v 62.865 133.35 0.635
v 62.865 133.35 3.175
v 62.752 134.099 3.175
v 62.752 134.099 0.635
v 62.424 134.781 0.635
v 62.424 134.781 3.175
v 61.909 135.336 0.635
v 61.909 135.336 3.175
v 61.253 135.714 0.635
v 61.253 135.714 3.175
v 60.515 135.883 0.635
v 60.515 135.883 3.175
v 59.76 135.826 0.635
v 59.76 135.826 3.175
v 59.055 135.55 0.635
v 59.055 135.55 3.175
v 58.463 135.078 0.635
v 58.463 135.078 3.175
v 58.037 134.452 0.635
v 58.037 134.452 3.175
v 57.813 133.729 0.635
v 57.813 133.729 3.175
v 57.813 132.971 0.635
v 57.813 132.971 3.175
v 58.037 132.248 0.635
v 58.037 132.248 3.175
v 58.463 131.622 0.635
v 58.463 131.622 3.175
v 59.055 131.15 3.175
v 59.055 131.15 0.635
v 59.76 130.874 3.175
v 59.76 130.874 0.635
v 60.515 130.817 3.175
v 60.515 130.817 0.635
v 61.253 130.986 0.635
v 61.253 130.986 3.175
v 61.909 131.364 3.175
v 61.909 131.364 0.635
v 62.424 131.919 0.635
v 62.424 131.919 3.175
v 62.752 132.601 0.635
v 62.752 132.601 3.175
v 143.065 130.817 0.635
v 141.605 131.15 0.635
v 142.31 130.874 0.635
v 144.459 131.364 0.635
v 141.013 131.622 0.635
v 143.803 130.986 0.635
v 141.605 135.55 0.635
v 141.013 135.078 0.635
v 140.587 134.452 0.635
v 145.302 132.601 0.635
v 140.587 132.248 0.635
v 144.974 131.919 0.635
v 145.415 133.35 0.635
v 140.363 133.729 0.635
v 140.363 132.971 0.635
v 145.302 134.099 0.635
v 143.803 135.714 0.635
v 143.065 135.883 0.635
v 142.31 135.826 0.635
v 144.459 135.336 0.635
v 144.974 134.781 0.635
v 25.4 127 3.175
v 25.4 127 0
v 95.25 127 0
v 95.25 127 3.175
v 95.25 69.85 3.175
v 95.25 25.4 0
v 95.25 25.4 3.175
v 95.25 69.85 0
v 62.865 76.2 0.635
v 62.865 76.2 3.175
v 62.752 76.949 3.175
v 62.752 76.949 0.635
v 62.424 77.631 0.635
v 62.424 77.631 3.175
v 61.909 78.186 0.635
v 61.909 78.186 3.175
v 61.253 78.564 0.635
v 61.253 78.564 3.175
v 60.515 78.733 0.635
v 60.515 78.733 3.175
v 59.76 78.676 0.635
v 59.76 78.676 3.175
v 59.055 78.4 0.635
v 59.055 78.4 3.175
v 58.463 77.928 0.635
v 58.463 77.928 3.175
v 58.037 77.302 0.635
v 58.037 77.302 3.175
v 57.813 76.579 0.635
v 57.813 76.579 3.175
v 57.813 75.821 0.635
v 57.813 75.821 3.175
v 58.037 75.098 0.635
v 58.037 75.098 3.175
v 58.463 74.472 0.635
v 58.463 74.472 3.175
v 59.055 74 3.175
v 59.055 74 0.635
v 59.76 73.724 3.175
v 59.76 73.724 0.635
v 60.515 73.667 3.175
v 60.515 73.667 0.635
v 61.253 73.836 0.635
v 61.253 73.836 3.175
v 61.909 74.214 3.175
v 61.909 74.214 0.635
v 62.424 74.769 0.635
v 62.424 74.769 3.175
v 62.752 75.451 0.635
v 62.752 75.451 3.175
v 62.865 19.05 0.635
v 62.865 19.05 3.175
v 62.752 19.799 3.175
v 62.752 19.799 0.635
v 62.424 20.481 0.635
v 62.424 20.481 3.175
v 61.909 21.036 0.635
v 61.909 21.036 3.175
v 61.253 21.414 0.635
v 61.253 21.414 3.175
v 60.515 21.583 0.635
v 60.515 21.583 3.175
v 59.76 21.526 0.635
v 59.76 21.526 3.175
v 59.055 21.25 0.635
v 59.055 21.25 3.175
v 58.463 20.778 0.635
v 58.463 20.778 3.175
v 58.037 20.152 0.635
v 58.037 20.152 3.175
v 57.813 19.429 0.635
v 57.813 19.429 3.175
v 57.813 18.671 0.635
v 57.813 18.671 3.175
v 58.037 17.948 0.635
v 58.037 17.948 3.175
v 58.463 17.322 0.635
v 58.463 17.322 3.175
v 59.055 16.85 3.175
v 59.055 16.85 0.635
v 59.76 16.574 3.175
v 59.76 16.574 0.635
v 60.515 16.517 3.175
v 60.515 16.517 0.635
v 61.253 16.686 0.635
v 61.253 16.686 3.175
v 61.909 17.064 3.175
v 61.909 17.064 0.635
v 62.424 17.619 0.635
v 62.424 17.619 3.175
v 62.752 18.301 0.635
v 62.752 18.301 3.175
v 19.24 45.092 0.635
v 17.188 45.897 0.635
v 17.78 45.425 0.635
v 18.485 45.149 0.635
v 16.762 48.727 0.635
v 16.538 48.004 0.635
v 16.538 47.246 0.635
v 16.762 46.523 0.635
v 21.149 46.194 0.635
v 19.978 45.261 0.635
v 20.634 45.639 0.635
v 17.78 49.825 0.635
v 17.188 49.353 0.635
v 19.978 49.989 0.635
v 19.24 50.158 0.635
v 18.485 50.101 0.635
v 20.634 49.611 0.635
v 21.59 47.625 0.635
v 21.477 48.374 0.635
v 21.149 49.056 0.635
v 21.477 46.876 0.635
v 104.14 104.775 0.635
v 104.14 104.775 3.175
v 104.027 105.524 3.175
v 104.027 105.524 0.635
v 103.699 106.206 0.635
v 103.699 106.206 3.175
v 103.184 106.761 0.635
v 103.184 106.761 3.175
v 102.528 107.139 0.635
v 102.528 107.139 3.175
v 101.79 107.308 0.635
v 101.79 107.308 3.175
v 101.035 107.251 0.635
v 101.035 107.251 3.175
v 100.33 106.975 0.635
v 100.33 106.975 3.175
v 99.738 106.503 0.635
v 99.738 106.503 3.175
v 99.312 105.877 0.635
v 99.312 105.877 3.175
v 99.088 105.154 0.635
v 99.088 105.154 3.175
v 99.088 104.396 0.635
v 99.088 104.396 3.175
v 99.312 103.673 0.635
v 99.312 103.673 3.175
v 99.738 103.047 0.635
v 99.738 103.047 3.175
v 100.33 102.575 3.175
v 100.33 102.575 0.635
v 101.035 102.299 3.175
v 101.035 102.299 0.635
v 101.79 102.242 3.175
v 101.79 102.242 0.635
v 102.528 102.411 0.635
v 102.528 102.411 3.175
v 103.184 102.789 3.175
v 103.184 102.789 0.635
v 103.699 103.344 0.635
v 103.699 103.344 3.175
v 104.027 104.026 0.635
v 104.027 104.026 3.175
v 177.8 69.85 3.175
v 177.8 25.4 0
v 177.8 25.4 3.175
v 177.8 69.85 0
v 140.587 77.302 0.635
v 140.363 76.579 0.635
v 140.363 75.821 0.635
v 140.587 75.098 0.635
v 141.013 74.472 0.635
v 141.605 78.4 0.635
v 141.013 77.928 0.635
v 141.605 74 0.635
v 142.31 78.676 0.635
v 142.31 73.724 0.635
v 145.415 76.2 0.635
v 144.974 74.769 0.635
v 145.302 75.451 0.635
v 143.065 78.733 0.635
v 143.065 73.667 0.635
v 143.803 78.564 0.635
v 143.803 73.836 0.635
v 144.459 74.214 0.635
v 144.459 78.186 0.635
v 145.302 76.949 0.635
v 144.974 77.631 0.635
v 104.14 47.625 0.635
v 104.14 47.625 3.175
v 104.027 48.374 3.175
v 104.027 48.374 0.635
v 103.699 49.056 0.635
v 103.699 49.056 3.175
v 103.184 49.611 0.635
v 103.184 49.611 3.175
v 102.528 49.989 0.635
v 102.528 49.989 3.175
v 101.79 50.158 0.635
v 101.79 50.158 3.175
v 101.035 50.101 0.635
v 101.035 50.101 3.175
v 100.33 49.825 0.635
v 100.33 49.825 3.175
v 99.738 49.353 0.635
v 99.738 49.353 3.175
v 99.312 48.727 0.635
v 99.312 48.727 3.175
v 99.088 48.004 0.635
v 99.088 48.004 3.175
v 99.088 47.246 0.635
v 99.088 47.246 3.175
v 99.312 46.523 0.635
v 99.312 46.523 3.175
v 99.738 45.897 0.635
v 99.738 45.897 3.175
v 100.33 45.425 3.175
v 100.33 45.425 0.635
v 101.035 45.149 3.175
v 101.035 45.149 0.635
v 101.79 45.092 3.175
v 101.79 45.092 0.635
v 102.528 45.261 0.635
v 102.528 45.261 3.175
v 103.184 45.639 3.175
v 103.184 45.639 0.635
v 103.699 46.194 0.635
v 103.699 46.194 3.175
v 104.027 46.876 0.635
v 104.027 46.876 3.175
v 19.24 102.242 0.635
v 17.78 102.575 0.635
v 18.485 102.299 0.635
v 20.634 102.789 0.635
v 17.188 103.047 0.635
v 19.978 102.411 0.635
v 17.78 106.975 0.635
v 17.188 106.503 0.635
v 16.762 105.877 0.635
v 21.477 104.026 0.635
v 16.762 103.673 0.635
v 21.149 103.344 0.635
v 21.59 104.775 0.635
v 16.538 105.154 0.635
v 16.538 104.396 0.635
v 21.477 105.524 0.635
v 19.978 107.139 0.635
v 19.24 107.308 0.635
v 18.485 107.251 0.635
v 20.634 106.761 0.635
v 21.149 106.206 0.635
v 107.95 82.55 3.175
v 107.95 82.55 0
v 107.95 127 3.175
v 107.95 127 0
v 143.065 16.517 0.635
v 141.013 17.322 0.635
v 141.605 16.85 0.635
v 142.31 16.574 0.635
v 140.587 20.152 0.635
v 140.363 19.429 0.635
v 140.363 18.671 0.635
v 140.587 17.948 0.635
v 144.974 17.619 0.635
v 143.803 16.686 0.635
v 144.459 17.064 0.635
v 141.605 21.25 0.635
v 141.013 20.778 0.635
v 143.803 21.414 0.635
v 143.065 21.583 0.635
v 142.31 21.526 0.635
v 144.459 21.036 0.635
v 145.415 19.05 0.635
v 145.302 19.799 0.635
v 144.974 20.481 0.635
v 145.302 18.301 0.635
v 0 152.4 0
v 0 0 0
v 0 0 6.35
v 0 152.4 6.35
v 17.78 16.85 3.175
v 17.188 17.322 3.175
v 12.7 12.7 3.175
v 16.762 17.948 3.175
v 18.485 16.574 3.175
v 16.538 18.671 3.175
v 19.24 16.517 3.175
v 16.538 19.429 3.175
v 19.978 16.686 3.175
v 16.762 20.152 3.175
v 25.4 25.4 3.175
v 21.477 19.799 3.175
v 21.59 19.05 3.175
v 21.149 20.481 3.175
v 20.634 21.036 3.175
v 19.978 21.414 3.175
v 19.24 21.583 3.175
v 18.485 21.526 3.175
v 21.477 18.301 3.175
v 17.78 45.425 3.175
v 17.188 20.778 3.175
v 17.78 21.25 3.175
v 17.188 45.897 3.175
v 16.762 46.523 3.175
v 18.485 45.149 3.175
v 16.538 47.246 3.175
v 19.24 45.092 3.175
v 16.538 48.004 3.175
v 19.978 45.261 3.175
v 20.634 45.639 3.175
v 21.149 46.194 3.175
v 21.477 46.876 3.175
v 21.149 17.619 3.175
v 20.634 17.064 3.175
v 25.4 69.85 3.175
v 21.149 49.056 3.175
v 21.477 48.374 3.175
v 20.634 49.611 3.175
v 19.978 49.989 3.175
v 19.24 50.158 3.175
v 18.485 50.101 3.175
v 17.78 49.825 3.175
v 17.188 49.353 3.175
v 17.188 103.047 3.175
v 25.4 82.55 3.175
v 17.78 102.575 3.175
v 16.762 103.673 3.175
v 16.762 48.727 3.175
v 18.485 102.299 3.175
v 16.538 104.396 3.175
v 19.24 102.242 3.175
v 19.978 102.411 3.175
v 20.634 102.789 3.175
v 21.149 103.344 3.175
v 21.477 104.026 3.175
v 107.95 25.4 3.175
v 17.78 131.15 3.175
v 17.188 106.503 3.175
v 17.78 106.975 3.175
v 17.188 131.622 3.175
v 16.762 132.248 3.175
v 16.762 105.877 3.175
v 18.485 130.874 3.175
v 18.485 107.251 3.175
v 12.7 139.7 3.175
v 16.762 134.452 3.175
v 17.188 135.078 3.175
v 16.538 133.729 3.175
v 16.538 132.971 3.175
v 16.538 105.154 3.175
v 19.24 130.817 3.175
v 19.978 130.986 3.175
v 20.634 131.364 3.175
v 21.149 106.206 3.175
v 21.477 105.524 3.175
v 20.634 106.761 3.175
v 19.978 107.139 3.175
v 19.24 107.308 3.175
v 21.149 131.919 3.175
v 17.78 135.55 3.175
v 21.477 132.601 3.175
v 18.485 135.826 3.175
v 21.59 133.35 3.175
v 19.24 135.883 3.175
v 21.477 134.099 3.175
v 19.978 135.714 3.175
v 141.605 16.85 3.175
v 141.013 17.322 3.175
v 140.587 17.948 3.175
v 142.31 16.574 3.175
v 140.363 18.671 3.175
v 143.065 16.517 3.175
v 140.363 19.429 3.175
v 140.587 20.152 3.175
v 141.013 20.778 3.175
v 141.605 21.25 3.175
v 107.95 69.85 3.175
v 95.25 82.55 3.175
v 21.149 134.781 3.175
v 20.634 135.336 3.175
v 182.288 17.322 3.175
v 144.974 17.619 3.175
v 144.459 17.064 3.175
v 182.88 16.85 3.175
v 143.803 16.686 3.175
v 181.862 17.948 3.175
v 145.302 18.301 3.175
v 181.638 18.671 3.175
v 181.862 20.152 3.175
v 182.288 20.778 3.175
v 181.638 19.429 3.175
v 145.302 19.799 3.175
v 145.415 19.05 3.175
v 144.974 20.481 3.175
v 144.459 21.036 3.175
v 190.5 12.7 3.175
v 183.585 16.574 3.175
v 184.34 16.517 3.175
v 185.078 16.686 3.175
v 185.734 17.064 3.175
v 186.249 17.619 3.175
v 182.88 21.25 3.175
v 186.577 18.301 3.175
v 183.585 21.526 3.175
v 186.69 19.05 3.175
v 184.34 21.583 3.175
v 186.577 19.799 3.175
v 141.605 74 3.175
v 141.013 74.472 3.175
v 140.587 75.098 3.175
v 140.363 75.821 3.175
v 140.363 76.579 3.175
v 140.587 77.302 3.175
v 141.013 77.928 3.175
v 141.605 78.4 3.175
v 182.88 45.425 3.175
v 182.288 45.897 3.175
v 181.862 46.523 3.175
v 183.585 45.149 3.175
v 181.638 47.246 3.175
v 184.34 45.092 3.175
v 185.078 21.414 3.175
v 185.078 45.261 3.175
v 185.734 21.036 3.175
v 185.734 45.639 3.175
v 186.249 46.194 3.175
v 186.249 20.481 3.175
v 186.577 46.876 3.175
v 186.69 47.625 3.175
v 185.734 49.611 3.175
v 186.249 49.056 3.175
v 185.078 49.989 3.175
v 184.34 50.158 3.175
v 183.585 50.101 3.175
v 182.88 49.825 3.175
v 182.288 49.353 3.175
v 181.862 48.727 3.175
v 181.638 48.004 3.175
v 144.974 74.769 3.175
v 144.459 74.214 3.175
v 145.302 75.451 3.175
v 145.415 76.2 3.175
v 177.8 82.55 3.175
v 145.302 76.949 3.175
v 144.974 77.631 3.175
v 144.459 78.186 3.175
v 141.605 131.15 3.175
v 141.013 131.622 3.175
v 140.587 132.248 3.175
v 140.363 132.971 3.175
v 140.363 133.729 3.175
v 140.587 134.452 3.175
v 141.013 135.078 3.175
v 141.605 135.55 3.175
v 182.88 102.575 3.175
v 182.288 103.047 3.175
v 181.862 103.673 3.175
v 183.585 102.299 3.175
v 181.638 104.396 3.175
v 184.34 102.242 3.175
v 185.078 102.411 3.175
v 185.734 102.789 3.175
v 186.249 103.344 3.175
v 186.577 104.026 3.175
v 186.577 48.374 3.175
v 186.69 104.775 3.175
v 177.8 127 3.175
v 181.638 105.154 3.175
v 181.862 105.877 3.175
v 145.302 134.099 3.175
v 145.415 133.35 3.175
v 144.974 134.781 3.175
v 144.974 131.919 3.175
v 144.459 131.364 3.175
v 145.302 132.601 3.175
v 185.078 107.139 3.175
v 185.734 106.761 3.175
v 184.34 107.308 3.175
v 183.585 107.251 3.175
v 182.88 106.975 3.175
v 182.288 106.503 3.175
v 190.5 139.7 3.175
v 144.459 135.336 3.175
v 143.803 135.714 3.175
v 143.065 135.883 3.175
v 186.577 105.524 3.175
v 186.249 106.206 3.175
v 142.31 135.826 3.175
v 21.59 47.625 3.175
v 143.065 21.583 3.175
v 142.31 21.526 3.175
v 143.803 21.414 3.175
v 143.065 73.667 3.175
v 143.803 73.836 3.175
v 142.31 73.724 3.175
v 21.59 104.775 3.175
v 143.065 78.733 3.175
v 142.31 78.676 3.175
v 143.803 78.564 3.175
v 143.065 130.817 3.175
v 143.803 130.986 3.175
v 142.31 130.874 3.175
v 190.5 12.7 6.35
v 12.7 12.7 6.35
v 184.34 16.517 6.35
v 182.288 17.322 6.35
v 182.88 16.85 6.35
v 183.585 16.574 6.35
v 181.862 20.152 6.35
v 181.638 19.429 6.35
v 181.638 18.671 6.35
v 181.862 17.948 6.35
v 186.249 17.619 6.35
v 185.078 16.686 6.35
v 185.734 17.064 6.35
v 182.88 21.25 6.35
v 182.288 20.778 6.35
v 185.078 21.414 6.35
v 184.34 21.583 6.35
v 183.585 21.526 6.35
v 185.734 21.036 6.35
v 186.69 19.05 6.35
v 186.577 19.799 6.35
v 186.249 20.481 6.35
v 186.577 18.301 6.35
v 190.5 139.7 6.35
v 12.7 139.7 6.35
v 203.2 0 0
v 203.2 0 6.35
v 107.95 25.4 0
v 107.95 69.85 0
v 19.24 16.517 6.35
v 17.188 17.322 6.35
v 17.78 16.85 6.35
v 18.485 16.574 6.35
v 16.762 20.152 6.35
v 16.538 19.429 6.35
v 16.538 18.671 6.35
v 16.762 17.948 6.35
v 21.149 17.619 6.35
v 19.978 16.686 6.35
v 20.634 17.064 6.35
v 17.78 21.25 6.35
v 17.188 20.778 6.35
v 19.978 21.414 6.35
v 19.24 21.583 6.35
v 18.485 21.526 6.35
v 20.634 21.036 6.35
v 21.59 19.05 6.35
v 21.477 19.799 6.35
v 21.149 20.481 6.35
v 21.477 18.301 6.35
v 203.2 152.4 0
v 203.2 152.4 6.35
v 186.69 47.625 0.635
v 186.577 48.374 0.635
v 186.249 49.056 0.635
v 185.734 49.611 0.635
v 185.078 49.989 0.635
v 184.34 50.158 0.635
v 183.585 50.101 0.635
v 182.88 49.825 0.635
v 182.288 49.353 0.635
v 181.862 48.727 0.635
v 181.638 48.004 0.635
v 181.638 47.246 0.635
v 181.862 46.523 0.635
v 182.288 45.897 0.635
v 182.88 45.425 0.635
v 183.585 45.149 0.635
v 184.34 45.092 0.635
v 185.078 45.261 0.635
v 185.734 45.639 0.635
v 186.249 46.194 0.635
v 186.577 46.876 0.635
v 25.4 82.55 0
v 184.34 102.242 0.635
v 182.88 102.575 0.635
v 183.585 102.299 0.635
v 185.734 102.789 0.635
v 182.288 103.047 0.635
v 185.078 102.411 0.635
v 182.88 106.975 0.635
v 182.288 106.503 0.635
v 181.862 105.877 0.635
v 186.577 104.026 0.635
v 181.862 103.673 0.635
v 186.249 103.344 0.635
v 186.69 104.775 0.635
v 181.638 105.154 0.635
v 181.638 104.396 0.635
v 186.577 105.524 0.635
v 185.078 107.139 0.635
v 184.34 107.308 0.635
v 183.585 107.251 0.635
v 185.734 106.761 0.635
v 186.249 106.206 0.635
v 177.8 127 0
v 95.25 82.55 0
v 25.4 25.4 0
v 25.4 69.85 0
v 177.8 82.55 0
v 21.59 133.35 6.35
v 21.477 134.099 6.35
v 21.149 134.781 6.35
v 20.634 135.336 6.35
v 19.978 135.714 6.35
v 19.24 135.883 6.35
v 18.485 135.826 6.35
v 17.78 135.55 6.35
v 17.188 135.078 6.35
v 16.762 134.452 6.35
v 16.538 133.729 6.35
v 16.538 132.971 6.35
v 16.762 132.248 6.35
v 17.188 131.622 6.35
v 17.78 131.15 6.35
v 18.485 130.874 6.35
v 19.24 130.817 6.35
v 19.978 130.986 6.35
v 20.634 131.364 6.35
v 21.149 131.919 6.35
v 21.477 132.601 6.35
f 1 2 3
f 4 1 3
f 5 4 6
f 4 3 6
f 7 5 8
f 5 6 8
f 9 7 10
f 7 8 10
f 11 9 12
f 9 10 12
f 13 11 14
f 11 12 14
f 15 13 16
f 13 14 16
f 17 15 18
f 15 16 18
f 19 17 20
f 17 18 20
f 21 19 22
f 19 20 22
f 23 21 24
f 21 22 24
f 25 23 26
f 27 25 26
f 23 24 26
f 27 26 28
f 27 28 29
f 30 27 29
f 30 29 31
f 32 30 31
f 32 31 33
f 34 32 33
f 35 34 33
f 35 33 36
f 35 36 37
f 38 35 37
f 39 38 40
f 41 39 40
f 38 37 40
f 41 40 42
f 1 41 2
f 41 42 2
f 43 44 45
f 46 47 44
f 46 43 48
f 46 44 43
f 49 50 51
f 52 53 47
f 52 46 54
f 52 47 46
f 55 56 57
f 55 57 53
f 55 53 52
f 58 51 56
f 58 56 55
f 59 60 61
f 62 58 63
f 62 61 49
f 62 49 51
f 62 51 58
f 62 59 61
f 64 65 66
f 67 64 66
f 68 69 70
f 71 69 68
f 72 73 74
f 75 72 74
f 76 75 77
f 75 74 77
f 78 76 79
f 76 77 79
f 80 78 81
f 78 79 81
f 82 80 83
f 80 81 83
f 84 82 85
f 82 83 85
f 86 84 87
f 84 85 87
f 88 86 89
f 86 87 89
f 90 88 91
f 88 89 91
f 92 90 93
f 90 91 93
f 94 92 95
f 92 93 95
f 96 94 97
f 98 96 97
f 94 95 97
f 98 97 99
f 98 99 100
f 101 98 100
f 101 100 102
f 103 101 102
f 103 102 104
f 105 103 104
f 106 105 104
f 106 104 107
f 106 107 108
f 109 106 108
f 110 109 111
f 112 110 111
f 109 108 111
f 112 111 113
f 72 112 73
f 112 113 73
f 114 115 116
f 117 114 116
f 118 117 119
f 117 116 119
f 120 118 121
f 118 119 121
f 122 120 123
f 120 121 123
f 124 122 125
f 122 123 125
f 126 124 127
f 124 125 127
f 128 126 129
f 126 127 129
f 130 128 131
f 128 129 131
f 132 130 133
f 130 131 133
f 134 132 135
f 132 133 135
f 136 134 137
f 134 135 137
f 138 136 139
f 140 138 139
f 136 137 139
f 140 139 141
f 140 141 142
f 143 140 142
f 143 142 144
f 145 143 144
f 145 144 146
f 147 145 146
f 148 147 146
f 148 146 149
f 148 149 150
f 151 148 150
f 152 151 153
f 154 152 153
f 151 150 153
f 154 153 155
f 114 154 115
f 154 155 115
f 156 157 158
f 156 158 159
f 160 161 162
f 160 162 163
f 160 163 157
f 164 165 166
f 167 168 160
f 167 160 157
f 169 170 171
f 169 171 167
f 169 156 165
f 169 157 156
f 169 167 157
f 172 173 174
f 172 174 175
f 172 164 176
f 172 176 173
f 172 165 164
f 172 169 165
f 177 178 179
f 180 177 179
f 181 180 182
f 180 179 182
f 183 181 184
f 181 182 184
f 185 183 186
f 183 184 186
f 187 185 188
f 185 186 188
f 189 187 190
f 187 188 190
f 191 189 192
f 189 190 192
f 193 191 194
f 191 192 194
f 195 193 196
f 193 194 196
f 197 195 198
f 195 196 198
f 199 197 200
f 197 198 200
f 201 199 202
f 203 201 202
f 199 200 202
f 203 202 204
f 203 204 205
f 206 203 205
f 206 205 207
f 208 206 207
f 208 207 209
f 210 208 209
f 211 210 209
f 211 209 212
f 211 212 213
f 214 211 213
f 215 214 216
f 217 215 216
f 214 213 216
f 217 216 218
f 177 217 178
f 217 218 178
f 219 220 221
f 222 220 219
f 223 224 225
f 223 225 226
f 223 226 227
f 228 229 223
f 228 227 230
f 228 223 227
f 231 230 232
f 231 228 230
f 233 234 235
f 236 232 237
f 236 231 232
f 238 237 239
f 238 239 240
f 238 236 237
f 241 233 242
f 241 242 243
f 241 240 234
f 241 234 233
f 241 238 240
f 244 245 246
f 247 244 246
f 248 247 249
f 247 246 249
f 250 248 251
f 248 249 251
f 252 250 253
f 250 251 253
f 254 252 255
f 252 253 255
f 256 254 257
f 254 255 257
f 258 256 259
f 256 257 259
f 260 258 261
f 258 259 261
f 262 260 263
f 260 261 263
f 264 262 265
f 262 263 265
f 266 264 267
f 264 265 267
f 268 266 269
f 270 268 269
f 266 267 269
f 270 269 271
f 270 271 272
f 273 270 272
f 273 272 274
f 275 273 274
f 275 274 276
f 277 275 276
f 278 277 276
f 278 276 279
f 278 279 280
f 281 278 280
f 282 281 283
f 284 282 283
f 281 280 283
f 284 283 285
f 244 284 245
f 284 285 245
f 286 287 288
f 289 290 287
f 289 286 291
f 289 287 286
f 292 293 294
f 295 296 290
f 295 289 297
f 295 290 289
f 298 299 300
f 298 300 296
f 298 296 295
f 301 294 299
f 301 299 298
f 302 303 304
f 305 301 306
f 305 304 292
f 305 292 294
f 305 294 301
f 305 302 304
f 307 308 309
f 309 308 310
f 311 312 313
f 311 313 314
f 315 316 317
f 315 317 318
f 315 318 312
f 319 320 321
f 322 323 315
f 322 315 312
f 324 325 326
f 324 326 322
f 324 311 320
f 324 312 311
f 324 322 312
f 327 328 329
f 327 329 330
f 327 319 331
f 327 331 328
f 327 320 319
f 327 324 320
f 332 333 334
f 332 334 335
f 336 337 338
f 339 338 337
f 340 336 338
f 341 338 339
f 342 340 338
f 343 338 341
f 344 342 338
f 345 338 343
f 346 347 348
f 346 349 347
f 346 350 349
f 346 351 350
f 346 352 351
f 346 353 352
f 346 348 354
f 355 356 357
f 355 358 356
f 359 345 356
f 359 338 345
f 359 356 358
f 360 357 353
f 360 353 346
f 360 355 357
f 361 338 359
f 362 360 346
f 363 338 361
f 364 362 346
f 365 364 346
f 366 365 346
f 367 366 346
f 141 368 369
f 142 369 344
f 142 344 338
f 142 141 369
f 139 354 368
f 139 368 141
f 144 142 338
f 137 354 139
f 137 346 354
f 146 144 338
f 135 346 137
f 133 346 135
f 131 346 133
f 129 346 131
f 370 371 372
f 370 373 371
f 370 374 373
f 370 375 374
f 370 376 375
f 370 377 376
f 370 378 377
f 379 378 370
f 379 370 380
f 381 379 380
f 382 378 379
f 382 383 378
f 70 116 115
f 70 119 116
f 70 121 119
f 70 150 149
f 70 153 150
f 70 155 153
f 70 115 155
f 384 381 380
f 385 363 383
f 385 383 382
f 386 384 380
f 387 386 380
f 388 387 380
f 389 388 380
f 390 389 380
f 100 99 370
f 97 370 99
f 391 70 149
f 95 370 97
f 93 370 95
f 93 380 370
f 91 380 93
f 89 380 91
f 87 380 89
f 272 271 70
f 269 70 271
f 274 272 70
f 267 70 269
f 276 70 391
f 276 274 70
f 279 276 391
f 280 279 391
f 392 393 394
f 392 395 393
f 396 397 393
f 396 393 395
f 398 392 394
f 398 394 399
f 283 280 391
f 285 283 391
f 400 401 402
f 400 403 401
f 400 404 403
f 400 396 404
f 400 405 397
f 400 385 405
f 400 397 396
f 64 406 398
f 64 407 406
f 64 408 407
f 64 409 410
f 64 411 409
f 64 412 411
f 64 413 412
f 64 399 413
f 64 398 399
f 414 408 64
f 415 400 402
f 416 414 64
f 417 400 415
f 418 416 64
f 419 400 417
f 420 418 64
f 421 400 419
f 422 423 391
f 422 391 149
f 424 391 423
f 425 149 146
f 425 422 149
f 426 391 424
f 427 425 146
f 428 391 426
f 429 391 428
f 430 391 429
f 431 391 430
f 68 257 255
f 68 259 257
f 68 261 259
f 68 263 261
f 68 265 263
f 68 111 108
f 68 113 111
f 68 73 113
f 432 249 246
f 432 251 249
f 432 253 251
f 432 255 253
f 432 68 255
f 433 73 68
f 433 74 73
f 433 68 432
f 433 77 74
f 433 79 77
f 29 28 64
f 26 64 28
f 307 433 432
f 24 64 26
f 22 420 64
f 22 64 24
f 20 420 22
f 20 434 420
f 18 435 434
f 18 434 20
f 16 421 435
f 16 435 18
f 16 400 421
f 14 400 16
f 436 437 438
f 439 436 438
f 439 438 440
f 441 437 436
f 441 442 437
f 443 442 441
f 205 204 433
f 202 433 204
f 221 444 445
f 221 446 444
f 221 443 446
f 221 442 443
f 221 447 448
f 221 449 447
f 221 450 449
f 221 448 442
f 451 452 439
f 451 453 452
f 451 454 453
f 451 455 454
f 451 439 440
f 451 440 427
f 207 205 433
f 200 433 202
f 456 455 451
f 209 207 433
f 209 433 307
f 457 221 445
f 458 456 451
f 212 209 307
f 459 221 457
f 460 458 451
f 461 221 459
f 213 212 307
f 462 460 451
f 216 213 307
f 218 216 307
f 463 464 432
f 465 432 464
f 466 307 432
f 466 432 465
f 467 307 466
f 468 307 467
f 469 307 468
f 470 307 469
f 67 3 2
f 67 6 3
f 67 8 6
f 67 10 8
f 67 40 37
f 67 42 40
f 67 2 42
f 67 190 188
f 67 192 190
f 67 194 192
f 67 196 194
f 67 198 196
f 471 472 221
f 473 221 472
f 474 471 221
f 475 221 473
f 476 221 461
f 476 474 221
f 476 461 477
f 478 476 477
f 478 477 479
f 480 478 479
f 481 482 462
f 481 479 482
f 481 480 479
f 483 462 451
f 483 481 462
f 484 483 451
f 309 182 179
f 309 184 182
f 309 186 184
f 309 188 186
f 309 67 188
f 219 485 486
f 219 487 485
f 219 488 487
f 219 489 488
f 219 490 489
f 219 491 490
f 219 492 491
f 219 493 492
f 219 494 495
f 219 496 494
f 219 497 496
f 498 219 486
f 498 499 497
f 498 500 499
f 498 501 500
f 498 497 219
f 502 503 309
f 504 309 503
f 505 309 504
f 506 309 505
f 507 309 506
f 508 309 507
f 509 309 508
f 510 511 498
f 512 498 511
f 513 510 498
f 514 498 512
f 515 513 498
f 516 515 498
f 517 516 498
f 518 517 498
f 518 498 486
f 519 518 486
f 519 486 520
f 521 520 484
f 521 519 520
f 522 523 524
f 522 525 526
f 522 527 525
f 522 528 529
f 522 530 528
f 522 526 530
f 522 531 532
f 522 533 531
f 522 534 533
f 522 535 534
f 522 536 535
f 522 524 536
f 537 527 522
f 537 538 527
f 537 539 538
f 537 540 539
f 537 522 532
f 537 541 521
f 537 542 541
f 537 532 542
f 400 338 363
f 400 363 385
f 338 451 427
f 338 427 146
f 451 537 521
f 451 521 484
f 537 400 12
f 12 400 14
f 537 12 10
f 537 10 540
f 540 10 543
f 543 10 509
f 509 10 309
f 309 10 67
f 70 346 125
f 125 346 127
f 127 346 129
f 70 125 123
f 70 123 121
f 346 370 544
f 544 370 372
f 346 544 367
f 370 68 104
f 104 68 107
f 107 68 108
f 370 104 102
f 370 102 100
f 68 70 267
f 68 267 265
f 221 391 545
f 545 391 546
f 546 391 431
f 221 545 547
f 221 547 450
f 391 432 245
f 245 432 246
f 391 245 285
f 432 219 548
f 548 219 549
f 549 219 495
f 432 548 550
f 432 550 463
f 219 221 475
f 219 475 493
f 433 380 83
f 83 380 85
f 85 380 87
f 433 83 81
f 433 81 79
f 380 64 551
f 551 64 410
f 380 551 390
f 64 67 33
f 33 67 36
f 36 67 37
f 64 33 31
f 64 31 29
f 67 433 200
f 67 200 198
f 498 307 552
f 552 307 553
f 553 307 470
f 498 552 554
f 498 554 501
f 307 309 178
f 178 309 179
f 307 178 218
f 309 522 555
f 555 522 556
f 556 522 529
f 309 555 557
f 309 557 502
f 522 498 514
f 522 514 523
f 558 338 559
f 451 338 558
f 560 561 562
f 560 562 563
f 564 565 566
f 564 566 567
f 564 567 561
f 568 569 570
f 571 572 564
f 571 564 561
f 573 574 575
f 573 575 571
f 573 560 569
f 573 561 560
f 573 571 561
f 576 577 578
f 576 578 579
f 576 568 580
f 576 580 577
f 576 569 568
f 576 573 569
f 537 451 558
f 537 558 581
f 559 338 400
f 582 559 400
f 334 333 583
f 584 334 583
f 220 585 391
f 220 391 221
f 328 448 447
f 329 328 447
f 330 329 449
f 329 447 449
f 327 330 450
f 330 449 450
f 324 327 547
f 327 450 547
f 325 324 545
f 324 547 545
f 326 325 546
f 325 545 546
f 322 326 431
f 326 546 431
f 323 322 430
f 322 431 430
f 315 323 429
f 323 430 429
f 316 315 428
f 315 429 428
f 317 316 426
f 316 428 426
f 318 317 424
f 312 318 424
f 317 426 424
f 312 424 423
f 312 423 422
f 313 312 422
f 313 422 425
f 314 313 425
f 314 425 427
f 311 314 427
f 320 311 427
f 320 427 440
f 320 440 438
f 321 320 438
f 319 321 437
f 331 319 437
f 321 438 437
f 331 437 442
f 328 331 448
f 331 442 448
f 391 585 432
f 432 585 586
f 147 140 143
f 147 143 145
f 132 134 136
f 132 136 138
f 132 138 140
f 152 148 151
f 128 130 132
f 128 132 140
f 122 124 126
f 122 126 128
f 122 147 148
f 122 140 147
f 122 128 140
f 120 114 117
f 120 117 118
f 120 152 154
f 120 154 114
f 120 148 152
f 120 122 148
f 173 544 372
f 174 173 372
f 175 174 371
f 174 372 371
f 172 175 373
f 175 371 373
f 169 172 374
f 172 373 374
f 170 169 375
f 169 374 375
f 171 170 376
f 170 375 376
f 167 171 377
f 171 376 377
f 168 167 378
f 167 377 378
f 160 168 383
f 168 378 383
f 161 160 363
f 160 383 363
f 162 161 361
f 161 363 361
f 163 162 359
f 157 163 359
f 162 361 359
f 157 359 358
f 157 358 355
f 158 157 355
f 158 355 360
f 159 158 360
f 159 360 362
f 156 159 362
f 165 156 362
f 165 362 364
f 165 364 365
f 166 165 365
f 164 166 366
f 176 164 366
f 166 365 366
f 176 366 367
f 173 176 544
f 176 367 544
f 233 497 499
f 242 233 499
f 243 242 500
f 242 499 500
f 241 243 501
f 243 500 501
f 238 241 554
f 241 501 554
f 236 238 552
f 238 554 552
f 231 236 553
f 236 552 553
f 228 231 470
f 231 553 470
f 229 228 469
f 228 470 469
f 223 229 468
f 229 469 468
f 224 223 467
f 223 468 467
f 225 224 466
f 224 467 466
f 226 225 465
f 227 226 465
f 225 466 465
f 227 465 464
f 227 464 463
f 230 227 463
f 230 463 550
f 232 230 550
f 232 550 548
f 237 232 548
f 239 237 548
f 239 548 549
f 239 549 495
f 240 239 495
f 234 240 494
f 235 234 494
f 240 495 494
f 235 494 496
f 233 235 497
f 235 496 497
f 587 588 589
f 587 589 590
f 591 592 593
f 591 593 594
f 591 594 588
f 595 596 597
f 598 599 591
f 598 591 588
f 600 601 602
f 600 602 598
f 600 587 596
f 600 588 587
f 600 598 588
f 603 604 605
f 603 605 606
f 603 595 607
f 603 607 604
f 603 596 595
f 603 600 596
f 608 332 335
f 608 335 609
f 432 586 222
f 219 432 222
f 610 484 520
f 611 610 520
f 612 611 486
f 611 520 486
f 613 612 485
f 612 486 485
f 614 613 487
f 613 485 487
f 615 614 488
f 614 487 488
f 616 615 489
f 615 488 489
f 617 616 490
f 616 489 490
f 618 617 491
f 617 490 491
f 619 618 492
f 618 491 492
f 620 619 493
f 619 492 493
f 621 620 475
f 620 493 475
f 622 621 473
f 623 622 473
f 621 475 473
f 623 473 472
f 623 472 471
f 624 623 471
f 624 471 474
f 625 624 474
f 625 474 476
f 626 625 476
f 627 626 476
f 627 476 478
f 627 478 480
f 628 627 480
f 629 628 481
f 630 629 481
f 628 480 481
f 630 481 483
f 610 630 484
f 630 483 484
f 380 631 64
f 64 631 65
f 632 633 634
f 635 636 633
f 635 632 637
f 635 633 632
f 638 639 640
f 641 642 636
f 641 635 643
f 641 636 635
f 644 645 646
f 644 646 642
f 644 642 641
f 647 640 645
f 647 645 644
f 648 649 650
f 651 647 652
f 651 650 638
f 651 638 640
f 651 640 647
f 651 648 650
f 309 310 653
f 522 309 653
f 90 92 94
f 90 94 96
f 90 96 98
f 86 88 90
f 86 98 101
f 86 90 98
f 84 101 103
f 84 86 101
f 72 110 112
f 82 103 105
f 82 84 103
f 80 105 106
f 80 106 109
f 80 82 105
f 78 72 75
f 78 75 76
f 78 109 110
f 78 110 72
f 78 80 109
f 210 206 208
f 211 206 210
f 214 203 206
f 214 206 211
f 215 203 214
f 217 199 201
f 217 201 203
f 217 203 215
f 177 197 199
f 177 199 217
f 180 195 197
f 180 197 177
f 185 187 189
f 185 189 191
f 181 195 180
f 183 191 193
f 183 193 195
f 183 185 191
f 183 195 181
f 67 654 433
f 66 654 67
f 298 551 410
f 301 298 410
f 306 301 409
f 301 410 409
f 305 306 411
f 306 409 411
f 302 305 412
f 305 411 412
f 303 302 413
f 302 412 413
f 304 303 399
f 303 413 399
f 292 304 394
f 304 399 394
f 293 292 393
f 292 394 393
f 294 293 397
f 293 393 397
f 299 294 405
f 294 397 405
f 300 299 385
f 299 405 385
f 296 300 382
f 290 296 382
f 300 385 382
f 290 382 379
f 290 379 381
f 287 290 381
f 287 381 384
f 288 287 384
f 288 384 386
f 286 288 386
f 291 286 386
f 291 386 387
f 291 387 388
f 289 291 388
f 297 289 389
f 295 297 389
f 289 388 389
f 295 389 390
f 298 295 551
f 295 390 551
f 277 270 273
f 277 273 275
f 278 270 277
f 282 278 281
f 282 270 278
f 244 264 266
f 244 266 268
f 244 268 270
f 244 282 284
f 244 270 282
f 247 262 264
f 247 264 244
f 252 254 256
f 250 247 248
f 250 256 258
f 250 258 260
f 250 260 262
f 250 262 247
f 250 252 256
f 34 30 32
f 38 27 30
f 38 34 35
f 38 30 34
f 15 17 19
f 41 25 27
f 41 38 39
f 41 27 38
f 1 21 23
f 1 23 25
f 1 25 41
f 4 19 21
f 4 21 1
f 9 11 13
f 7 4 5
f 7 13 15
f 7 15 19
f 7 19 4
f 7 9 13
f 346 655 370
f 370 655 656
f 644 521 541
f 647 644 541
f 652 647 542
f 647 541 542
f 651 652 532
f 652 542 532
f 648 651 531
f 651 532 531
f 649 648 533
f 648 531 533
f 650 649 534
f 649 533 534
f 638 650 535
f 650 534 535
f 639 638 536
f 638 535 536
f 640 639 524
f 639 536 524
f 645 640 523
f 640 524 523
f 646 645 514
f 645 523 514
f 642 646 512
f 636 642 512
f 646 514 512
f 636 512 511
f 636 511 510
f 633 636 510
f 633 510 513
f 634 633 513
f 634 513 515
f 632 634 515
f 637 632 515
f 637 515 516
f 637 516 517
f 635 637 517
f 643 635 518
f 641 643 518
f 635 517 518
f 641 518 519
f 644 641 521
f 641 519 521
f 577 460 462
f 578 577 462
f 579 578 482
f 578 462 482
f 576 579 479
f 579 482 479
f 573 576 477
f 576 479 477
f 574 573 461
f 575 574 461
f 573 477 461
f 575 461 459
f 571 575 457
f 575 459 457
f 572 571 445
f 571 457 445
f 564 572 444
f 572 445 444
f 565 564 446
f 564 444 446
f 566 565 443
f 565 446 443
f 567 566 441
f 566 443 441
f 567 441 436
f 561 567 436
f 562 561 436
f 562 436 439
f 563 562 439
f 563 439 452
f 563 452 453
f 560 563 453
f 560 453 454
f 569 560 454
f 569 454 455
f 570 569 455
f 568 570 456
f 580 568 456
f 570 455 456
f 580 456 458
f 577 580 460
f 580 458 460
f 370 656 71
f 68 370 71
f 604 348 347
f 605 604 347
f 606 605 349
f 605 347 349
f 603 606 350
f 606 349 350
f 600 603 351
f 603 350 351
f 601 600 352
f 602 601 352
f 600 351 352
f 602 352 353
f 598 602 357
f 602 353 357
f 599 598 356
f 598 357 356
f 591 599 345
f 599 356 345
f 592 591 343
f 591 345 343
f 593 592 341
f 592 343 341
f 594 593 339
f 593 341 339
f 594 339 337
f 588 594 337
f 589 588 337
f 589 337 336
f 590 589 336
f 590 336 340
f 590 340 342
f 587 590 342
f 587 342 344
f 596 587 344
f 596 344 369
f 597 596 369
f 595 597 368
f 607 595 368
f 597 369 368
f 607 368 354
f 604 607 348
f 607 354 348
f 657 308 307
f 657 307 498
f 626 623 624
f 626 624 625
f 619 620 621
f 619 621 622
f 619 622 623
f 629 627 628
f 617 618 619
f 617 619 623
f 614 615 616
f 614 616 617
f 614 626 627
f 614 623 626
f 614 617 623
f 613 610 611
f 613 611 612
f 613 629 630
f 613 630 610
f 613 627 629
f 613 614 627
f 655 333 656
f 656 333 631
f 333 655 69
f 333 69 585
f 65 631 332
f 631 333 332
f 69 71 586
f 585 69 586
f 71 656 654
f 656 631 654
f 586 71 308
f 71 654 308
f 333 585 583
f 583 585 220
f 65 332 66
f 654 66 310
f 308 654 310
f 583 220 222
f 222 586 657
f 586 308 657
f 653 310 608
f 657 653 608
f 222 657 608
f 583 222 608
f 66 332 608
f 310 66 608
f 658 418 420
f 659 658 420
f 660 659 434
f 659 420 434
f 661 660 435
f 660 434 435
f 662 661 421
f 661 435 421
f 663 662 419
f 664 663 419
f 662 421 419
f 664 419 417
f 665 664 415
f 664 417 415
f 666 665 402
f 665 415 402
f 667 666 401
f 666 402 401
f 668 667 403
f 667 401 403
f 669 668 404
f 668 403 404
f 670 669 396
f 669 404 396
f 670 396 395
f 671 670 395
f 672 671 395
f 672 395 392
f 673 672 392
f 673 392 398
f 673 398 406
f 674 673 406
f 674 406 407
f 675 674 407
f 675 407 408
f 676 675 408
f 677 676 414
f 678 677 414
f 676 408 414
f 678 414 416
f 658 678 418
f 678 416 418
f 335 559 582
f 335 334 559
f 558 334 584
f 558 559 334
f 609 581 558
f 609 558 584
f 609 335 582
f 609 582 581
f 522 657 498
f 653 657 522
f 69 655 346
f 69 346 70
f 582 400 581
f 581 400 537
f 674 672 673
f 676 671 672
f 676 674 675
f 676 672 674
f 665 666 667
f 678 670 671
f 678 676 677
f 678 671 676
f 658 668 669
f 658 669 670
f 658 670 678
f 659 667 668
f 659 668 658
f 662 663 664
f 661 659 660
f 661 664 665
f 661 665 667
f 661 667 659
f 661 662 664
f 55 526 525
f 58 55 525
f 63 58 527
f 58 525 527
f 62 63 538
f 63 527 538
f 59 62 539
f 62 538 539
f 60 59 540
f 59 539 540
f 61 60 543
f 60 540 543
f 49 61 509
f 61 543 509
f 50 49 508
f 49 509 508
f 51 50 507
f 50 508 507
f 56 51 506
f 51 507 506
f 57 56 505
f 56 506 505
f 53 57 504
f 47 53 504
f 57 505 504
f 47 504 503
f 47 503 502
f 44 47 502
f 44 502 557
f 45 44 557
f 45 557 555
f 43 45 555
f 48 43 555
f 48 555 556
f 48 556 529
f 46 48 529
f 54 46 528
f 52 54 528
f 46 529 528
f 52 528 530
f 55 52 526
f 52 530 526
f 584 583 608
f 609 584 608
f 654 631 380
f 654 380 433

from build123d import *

# Parameters (mm, degrees)
F0_W     = 203.2
F0_H     = 152.4
F0_W_2   = 177.8
F0_H_2   = 127
F1_DEPTH = 6.35
F2_W     = 177.8
F2_H     = 127
F2_W_2   = 69.85
F2_H_2   = 44.45
F3_DEPTH = 3.175
F4_R     = 2.54
F5_DEPTH = 3.175
F6_R     = 2.54
F7_DEPTH = 2.54


with BuildPart() as f1:
    # F0 (on Top) → F1 (new body)
    with BuildSketch(Plane.XY):
        with Locations((101.6, 76.2)):
            Rectangle(F0_W, F0_H)
        with Locations((101.6, 76.2)):
            Rectangle(F0_W_2, F0_H_2, mode=Mode.SUBTRACT)
    extrude(amount=F1_DEPTH)

    # F2 (on Top) → F3 (join)
    with BuildSketch(Plane.XY):
        with Locations((101.6, 76.2)):
            Rectangle(F2_W, F2_H)
        with Locations((60.325, 47.625)):
            Rectangle(F2_W_2, F2_H_2, mode=Mode.SUBTRACT)
        with Locations((142.875, 47.625)):
            Rectangle(F2_W_2, F2_H_2, mode=Mode.SUBTRACT)
        with Locations((60.325, 104.775)):
            Rectangle(F2_W_2, F2_H_2, mode=Mode.SUBTRACT)
        with Locations((142.875, 104.775)):
            Rectangle(F2_W_2, F2_H_2, mode=Mode.SUBTRACT)
    extrude(amount=F3_DEPTH)

    # F4 (on face) → F5 (join, through all)
    with BuildSketch(Plane.XY.offset(3.175)):
        with Locations((19.05, 133.35)):
            Circle(F4_R)
        with Locations((19.05, 19.05)):
            Circle(F4_R)
        with Locations((184.15, 19.05)):
            Circle(F4_R)
    extrude(amount=F5_DEPTH)

    # F6 (on face) → F7 (cut)
    with BuildSketch(Plane.XY.offset(3.175)):
        with Locations((60.325, 133.35)):
            Circle(F6_R)
        with Locations((142.875, 133.35)):
            Circle(F6_R)
        with Locations((101.6, 47.625)):
            Circle(F6_R)
        with Locations((101.6, 104.775)):
            Circle(F6_R)
        with Locations((142.875, 76.2)):
            Circle(F6_R)
        with Locations((60.325, 19.05)):
            Circle(F6_R)
        with Locations((184.15, 47.625)):
            Circle(F6_R)
        with Locations((142.875, 19.05)):
            Circle(F6_R)
        with Locations((19.05, 47.625)):
            Circle(F6_R)
        with Locations((184.15, 104.775)):
            Circle(F6_R)
        with Locations((60.325, 76.2)):
            Circle(F6_R)
        with Locations((19.05, 104.775)):
            Circle(F6_R)
    extrude(amount=-F7_DEPTH, mode=Mode.SUBTRACT)


solid = f1.part
